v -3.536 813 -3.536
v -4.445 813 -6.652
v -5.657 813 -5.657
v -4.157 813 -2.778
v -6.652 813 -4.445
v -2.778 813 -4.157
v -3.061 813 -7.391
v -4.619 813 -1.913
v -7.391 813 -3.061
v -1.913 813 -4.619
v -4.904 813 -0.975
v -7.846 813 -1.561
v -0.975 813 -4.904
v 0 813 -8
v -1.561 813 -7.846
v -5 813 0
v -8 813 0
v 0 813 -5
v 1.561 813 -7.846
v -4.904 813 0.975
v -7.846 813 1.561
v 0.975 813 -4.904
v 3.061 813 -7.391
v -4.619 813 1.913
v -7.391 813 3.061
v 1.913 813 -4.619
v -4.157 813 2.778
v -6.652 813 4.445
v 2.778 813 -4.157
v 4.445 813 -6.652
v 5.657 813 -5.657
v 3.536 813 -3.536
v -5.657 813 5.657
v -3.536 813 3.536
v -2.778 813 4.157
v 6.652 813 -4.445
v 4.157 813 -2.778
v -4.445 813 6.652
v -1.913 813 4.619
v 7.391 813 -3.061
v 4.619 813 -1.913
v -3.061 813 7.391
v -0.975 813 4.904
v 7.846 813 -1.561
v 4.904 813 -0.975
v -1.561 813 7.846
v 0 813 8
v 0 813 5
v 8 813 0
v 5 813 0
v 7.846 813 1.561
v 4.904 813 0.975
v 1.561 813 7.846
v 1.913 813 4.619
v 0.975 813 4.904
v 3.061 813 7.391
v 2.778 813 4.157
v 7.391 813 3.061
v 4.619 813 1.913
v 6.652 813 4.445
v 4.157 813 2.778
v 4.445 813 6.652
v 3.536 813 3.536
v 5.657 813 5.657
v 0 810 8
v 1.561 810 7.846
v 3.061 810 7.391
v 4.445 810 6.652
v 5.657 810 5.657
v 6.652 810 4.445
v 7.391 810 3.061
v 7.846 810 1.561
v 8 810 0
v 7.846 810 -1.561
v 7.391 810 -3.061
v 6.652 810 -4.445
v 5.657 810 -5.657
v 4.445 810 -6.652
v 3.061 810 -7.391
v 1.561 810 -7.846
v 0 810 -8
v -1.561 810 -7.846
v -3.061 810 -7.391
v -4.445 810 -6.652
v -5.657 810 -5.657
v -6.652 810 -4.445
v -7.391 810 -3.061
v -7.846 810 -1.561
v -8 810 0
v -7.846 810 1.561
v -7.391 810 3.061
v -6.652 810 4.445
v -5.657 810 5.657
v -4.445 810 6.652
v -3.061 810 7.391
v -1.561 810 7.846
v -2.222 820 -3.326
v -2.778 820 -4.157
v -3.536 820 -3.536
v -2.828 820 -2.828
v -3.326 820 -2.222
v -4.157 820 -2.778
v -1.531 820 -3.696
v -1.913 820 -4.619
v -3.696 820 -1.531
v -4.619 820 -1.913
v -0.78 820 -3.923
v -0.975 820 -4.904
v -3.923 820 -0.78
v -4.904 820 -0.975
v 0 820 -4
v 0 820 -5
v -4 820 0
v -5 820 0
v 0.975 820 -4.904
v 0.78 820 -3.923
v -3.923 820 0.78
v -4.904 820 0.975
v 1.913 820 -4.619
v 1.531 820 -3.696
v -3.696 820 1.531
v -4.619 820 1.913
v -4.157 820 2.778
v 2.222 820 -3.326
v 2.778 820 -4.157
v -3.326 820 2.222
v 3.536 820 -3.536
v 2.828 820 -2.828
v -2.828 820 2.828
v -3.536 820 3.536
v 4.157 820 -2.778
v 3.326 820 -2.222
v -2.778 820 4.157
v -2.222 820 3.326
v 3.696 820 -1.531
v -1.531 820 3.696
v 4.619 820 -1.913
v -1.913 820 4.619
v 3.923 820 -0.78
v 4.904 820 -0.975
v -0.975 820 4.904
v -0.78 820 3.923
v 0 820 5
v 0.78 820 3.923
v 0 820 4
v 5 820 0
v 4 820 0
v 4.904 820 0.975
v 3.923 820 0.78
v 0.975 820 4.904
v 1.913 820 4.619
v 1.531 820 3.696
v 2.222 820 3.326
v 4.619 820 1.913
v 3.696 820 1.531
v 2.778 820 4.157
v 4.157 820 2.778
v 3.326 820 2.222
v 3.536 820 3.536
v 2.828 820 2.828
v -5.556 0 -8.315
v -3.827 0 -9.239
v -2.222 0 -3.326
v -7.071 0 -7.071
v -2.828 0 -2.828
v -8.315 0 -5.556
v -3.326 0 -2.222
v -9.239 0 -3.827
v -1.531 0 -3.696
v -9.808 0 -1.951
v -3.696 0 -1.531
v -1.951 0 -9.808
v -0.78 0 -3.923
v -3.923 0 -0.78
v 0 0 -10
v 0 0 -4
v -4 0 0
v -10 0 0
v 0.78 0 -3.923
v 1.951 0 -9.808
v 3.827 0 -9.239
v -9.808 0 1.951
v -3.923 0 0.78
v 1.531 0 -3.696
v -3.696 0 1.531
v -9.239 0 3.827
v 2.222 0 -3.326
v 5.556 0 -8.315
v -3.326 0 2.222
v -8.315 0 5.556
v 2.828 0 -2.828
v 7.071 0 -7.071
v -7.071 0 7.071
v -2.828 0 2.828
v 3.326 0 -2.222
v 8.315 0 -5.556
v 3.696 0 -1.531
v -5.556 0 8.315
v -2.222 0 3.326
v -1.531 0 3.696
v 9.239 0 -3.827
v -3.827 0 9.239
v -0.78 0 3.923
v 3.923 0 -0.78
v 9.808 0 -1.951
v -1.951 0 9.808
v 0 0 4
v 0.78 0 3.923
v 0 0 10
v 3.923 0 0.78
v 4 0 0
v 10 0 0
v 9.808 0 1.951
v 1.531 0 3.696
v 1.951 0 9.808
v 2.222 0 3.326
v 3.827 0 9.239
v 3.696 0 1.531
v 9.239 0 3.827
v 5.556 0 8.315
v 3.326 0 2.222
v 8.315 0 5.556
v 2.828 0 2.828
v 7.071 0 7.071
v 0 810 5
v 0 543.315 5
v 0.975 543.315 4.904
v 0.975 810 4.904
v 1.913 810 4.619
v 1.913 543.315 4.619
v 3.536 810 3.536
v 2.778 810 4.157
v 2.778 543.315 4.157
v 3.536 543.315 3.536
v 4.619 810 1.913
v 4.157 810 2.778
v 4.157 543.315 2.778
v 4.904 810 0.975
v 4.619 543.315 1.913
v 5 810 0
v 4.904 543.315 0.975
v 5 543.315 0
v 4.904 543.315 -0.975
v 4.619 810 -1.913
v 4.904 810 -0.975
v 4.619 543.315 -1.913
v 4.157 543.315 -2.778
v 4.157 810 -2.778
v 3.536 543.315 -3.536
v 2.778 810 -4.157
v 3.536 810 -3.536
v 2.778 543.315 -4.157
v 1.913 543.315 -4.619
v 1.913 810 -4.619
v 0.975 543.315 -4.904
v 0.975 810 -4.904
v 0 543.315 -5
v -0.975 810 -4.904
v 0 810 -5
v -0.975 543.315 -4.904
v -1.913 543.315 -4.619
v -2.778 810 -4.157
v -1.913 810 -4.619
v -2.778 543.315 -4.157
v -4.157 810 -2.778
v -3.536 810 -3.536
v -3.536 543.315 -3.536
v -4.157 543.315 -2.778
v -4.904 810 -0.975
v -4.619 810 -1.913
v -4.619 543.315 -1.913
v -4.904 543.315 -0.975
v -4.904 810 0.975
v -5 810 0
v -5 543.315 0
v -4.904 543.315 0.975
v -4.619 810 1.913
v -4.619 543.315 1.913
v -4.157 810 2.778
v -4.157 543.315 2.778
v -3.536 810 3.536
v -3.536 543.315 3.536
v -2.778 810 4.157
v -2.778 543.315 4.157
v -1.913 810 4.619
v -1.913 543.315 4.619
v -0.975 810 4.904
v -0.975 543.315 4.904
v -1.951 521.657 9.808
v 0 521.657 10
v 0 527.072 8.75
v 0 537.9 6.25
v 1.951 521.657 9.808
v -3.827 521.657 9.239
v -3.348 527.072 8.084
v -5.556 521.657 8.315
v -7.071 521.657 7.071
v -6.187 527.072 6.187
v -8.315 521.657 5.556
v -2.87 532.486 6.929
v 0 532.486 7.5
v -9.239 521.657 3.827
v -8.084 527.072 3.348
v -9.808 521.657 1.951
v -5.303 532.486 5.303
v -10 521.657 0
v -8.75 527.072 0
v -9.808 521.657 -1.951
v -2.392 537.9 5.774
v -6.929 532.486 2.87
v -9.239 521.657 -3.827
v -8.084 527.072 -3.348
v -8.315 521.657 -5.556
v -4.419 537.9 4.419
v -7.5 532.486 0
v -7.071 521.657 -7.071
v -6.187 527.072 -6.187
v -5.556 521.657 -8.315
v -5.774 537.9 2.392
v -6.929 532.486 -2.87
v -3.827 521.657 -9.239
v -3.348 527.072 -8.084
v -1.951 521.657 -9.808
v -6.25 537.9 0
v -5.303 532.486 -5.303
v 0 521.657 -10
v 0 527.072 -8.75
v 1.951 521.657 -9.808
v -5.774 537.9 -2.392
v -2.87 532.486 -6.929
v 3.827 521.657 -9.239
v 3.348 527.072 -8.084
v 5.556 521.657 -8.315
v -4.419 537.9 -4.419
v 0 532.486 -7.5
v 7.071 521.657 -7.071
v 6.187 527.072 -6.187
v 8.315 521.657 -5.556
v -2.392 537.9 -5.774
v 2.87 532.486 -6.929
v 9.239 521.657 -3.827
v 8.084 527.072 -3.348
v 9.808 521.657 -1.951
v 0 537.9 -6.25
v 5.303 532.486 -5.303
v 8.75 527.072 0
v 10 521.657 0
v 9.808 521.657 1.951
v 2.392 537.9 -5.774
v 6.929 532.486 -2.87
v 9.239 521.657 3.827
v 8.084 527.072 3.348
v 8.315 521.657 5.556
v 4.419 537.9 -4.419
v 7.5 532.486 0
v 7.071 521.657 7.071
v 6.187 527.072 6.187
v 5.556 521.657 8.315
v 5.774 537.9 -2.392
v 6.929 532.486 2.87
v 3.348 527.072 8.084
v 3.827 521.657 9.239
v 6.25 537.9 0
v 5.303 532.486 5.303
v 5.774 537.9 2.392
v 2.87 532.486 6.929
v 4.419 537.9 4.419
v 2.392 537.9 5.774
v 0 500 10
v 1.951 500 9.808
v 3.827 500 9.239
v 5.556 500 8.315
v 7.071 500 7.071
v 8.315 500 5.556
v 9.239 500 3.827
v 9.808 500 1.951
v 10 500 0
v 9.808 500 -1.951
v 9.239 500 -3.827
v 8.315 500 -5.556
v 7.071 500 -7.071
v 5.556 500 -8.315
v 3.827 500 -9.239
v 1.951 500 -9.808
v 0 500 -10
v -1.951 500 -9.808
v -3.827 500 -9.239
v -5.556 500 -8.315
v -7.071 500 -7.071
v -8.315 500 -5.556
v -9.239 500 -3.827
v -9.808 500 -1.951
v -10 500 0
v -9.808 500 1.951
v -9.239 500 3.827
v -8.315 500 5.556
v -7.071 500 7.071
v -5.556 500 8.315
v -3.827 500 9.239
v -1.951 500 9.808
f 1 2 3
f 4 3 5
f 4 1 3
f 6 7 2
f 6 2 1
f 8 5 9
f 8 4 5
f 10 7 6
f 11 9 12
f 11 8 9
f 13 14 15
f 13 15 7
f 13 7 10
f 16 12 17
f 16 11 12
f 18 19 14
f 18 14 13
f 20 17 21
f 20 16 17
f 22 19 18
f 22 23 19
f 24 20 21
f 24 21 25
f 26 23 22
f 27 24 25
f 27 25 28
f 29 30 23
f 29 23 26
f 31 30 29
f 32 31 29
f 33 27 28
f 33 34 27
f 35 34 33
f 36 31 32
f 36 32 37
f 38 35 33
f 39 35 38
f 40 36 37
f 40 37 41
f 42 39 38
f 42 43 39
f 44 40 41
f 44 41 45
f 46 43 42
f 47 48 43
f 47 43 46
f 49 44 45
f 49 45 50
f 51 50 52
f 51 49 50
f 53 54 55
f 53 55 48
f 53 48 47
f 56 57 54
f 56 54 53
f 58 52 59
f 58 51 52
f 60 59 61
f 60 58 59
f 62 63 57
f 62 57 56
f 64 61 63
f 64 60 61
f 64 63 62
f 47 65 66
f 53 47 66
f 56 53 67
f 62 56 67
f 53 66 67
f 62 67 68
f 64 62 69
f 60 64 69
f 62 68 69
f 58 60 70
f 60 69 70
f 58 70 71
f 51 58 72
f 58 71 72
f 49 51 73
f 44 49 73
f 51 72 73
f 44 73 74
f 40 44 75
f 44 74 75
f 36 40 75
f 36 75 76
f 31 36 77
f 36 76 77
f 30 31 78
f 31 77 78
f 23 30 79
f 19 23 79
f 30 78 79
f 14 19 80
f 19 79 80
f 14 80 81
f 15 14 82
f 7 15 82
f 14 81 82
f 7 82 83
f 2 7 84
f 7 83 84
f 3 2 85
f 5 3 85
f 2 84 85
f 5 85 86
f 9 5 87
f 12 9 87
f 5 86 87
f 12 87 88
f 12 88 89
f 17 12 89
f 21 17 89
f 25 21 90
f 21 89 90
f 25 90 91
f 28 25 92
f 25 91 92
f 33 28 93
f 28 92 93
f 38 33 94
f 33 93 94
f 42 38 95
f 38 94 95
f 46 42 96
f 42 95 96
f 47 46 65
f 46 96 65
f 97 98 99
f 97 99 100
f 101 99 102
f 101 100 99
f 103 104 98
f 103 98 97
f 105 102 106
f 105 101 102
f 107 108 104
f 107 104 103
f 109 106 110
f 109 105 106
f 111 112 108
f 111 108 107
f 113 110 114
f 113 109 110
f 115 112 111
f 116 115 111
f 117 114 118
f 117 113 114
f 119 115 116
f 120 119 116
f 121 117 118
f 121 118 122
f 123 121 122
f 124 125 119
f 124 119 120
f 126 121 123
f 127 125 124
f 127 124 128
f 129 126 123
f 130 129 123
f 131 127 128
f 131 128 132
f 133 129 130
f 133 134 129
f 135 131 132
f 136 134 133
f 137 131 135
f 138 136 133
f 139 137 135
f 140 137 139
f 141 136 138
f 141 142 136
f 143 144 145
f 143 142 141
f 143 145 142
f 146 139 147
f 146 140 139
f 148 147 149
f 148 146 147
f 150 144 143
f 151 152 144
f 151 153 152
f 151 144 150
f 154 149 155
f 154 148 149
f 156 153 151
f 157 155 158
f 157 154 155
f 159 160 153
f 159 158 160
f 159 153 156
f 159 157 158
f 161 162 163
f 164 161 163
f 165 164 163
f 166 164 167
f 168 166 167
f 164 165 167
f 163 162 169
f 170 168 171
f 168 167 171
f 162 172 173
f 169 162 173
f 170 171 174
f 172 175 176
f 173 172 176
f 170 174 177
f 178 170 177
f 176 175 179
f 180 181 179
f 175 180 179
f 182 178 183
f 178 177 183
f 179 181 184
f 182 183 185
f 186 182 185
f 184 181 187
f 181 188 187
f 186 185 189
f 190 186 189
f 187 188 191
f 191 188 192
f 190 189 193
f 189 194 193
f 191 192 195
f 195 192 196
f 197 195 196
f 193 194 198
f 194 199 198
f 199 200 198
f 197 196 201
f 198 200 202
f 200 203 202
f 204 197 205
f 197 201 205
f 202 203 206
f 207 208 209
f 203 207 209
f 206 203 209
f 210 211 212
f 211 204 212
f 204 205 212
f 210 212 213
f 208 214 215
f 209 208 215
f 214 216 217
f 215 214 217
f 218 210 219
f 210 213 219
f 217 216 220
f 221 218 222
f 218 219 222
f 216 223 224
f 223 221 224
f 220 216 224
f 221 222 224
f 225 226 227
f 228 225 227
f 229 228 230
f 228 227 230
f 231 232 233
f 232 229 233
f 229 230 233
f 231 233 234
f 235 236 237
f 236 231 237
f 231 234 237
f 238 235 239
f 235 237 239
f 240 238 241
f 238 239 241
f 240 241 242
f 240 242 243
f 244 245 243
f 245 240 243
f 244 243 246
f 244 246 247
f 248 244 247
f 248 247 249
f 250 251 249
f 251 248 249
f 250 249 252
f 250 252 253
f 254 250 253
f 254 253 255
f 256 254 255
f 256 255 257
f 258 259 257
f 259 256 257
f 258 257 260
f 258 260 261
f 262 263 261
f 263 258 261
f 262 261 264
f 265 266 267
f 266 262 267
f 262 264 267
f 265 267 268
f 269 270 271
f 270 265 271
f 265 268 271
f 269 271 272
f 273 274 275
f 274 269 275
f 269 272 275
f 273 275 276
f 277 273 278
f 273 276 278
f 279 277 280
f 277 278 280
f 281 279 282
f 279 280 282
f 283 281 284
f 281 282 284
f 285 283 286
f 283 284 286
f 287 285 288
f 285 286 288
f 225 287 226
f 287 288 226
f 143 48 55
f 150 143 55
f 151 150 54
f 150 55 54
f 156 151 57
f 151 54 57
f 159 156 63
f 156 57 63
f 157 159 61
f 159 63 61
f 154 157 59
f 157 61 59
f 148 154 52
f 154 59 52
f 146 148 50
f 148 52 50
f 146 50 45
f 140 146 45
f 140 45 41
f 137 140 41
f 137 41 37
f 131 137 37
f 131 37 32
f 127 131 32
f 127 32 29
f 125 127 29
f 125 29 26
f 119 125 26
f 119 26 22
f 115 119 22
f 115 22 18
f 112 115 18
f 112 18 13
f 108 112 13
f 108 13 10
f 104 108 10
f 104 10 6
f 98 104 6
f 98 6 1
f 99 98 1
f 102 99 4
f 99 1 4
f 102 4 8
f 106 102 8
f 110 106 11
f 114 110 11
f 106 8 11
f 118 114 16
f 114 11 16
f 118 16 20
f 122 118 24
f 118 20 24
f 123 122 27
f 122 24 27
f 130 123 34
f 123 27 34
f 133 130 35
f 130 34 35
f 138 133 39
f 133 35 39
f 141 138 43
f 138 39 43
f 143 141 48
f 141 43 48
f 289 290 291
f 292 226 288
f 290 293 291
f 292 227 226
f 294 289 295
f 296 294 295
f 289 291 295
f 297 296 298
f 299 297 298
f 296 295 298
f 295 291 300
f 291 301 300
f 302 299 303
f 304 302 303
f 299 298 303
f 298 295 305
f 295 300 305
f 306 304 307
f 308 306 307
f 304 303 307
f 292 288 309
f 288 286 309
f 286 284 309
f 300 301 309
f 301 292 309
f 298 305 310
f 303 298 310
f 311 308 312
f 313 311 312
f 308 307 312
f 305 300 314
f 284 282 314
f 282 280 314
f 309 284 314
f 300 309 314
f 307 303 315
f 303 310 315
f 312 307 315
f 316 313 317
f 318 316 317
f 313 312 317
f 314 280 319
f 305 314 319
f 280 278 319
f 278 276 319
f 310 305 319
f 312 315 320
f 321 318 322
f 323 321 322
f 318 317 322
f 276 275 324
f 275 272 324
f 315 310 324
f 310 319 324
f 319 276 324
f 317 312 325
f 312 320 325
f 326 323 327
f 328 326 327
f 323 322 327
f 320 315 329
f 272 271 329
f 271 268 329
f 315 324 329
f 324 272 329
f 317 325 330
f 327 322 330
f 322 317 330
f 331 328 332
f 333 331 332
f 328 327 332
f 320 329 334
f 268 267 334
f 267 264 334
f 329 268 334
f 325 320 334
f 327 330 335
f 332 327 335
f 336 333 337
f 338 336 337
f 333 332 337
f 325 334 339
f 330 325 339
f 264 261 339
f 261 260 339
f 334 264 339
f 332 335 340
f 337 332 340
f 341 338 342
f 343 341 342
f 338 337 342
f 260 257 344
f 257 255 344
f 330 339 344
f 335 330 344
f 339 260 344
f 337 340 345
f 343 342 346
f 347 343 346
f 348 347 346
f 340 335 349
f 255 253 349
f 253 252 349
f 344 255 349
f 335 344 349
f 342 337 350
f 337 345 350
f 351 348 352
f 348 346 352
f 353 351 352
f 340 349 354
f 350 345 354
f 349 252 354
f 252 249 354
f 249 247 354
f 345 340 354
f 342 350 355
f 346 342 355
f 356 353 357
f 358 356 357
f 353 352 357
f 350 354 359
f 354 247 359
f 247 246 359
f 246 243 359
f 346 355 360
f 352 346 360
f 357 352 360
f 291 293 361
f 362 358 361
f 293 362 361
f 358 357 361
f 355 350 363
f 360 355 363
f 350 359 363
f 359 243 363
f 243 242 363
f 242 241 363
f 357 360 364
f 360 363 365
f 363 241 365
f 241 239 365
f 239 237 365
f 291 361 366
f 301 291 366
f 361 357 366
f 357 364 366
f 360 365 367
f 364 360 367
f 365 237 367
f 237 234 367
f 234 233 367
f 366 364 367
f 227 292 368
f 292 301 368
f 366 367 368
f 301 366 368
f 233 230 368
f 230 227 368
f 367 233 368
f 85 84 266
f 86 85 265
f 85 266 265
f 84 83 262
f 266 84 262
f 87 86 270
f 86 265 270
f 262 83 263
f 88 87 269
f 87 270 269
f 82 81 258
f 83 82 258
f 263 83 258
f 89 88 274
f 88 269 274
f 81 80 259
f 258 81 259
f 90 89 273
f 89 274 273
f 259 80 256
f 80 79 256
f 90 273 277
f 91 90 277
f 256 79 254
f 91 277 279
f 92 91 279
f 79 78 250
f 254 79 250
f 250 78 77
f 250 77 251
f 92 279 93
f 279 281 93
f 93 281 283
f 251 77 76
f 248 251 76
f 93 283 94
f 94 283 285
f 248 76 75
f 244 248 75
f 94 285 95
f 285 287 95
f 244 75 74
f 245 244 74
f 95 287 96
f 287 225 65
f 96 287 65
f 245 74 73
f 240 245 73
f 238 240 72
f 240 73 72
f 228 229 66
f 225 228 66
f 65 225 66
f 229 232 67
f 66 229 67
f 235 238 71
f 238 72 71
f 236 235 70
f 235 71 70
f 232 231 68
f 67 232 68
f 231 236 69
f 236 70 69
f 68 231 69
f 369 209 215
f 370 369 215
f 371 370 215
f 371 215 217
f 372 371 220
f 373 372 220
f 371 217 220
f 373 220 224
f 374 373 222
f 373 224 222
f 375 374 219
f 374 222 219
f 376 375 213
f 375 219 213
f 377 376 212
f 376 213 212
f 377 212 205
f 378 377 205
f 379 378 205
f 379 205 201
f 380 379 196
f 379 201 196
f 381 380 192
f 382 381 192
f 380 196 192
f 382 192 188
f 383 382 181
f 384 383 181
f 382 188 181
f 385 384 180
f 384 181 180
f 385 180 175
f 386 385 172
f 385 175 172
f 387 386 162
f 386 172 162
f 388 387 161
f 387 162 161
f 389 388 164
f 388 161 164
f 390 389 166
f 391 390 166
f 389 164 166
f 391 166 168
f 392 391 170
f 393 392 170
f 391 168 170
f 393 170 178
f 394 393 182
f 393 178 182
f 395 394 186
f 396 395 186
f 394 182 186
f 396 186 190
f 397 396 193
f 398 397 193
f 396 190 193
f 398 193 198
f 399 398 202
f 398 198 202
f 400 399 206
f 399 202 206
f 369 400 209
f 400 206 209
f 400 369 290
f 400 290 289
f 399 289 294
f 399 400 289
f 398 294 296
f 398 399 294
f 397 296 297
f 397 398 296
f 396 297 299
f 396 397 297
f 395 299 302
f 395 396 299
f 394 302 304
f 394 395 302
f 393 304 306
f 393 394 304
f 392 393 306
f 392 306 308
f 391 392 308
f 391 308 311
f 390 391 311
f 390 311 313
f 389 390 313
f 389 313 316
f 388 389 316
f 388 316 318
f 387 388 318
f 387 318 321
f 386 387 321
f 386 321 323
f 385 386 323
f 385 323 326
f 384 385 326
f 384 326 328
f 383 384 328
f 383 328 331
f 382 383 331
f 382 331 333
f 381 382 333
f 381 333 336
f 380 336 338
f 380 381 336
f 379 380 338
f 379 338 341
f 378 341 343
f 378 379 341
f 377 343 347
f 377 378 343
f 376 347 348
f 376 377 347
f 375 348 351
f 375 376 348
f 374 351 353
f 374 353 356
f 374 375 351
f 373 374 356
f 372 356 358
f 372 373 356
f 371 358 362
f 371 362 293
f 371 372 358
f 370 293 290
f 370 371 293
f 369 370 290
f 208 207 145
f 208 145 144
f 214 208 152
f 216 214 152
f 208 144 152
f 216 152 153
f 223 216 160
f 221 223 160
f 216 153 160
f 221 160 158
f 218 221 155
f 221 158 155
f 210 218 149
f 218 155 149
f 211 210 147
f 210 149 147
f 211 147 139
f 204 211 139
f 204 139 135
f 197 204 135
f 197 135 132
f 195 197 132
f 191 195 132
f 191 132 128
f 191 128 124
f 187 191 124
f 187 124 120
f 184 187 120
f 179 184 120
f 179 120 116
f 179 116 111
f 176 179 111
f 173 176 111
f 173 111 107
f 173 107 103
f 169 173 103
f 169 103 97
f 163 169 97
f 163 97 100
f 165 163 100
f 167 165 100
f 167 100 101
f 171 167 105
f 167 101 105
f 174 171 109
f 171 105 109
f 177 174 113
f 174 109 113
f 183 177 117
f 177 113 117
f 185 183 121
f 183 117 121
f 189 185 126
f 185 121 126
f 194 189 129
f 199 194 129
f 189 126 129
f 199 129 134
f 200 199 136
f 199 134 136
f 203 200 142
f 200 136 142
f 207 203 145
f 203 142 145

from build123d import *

# Parameters (mm, degrees)
ESQUISSE1_R             = 5
BOSS_EXTRU_1_DEPTH      = 820
ESQUISSE2_R             = 10
BOSS_EXTRU_2_DEPTH      = 500
CHANFREIN1_SIZE         = 10
CHANFREIN1_SIZE_2       = 43.314758743
ESQUISSE3_R             = 4
ENL_V_MAT_EXTRU_1_DEPTH = 821.121942153
ESQUISSE4_R             = 8
ESQUISSE4_R_2           = 4.5
BOSS_EXTRU_3_DEPTH      = 3


with BuildPart() as part:
    # Esquisse1 → Boss.-Extru.1 (new body)
    with BuildSketch(Plane(origin=(0, 0, 0), x_dir=(1, 0, 0), z_dir=(0, 1, 0))):
        with Locations(Location((0, 0, 0), (0, 0, 270))):
            Circle(ESQUISSE1_R)
    extrude(amount=BOSS_EXTRU_1_DEPTH)

    # Esquisse2 → Boss.-Extru.2 (add)
    with BuildSketch(Plane(origin=(0, 0, 0), x_dir=(1, 0, 0), z_dir=(0, 1, 0))):
        with Locations(Location((0, 0, 0), (0, 0, 270))):
            Circle(ESQUISSE2_R)
    extrude(amount=BOSS_EXTRU_2_DEPTH)

    # Chanfrein1
    # the kernel refuses this chamfer: 43.314758743, 10 mm, written as the material it adds along each edge
    with BuildSketch(Plane(origin=(0, 500, 0), x_dir=(0, 0, 1), z_dir=(1, 0, 0))) as chanfrein1_piece_1_section:
        Polygon((5 + CHANFREIN1_SIZE, 0), (5, -CHANFREIN1_SIZE_2), (5, 0), align=None)
    chanfrein1_piece_1 = revolve(axis=Axis((0, 500, 0), (0, -1, 0)), mode=Mode.PRIVATE)
    chanfrein1_piece_1 = chanfrein1_piece_1 & Plane(origin=(0, 533.283833366, 0), x_dir=(0, 0, 1), z_dir=(0, -1, 0)) * Cylinder(10, 174, mode=Mode.PRIVATE)
    add(chanfrein1_piece_1)

    # Esquisse3 → Enlèv. mat.-Extru.1 (cut, through all)
    with BuildSketch(Plane(origin=(0, 820, 0), x_dir=(1, 0, 0), z_dir=(0, 1, 0))):
        with Locations(Location((0, 0, 0), (0, 0, 270))):
            Circle(ESQUISSE3_R)
    extrude(amount=-ENL_V_MAT_EXTRU_1_DEPTH, mode=Mode.SUBTRACT)

    # Esquisse4 → Boss.-Extru.3 (add)
    with BuildSketch(Plane(origin=(0, 810, 0), x_dir=(1, 0, 0), z_dir=(0, 1, 0))):
        with Locations(Location((0, 0, 0), (0, 0, 270))):
            Circle(ESQUISSE4_R)
        Circle(ESQUISSE4_R_2, mode=Mode.SUBTRACT)
    extrude(amount=BOSS_EXTRU_3_DEPTH)


solid = part.part
